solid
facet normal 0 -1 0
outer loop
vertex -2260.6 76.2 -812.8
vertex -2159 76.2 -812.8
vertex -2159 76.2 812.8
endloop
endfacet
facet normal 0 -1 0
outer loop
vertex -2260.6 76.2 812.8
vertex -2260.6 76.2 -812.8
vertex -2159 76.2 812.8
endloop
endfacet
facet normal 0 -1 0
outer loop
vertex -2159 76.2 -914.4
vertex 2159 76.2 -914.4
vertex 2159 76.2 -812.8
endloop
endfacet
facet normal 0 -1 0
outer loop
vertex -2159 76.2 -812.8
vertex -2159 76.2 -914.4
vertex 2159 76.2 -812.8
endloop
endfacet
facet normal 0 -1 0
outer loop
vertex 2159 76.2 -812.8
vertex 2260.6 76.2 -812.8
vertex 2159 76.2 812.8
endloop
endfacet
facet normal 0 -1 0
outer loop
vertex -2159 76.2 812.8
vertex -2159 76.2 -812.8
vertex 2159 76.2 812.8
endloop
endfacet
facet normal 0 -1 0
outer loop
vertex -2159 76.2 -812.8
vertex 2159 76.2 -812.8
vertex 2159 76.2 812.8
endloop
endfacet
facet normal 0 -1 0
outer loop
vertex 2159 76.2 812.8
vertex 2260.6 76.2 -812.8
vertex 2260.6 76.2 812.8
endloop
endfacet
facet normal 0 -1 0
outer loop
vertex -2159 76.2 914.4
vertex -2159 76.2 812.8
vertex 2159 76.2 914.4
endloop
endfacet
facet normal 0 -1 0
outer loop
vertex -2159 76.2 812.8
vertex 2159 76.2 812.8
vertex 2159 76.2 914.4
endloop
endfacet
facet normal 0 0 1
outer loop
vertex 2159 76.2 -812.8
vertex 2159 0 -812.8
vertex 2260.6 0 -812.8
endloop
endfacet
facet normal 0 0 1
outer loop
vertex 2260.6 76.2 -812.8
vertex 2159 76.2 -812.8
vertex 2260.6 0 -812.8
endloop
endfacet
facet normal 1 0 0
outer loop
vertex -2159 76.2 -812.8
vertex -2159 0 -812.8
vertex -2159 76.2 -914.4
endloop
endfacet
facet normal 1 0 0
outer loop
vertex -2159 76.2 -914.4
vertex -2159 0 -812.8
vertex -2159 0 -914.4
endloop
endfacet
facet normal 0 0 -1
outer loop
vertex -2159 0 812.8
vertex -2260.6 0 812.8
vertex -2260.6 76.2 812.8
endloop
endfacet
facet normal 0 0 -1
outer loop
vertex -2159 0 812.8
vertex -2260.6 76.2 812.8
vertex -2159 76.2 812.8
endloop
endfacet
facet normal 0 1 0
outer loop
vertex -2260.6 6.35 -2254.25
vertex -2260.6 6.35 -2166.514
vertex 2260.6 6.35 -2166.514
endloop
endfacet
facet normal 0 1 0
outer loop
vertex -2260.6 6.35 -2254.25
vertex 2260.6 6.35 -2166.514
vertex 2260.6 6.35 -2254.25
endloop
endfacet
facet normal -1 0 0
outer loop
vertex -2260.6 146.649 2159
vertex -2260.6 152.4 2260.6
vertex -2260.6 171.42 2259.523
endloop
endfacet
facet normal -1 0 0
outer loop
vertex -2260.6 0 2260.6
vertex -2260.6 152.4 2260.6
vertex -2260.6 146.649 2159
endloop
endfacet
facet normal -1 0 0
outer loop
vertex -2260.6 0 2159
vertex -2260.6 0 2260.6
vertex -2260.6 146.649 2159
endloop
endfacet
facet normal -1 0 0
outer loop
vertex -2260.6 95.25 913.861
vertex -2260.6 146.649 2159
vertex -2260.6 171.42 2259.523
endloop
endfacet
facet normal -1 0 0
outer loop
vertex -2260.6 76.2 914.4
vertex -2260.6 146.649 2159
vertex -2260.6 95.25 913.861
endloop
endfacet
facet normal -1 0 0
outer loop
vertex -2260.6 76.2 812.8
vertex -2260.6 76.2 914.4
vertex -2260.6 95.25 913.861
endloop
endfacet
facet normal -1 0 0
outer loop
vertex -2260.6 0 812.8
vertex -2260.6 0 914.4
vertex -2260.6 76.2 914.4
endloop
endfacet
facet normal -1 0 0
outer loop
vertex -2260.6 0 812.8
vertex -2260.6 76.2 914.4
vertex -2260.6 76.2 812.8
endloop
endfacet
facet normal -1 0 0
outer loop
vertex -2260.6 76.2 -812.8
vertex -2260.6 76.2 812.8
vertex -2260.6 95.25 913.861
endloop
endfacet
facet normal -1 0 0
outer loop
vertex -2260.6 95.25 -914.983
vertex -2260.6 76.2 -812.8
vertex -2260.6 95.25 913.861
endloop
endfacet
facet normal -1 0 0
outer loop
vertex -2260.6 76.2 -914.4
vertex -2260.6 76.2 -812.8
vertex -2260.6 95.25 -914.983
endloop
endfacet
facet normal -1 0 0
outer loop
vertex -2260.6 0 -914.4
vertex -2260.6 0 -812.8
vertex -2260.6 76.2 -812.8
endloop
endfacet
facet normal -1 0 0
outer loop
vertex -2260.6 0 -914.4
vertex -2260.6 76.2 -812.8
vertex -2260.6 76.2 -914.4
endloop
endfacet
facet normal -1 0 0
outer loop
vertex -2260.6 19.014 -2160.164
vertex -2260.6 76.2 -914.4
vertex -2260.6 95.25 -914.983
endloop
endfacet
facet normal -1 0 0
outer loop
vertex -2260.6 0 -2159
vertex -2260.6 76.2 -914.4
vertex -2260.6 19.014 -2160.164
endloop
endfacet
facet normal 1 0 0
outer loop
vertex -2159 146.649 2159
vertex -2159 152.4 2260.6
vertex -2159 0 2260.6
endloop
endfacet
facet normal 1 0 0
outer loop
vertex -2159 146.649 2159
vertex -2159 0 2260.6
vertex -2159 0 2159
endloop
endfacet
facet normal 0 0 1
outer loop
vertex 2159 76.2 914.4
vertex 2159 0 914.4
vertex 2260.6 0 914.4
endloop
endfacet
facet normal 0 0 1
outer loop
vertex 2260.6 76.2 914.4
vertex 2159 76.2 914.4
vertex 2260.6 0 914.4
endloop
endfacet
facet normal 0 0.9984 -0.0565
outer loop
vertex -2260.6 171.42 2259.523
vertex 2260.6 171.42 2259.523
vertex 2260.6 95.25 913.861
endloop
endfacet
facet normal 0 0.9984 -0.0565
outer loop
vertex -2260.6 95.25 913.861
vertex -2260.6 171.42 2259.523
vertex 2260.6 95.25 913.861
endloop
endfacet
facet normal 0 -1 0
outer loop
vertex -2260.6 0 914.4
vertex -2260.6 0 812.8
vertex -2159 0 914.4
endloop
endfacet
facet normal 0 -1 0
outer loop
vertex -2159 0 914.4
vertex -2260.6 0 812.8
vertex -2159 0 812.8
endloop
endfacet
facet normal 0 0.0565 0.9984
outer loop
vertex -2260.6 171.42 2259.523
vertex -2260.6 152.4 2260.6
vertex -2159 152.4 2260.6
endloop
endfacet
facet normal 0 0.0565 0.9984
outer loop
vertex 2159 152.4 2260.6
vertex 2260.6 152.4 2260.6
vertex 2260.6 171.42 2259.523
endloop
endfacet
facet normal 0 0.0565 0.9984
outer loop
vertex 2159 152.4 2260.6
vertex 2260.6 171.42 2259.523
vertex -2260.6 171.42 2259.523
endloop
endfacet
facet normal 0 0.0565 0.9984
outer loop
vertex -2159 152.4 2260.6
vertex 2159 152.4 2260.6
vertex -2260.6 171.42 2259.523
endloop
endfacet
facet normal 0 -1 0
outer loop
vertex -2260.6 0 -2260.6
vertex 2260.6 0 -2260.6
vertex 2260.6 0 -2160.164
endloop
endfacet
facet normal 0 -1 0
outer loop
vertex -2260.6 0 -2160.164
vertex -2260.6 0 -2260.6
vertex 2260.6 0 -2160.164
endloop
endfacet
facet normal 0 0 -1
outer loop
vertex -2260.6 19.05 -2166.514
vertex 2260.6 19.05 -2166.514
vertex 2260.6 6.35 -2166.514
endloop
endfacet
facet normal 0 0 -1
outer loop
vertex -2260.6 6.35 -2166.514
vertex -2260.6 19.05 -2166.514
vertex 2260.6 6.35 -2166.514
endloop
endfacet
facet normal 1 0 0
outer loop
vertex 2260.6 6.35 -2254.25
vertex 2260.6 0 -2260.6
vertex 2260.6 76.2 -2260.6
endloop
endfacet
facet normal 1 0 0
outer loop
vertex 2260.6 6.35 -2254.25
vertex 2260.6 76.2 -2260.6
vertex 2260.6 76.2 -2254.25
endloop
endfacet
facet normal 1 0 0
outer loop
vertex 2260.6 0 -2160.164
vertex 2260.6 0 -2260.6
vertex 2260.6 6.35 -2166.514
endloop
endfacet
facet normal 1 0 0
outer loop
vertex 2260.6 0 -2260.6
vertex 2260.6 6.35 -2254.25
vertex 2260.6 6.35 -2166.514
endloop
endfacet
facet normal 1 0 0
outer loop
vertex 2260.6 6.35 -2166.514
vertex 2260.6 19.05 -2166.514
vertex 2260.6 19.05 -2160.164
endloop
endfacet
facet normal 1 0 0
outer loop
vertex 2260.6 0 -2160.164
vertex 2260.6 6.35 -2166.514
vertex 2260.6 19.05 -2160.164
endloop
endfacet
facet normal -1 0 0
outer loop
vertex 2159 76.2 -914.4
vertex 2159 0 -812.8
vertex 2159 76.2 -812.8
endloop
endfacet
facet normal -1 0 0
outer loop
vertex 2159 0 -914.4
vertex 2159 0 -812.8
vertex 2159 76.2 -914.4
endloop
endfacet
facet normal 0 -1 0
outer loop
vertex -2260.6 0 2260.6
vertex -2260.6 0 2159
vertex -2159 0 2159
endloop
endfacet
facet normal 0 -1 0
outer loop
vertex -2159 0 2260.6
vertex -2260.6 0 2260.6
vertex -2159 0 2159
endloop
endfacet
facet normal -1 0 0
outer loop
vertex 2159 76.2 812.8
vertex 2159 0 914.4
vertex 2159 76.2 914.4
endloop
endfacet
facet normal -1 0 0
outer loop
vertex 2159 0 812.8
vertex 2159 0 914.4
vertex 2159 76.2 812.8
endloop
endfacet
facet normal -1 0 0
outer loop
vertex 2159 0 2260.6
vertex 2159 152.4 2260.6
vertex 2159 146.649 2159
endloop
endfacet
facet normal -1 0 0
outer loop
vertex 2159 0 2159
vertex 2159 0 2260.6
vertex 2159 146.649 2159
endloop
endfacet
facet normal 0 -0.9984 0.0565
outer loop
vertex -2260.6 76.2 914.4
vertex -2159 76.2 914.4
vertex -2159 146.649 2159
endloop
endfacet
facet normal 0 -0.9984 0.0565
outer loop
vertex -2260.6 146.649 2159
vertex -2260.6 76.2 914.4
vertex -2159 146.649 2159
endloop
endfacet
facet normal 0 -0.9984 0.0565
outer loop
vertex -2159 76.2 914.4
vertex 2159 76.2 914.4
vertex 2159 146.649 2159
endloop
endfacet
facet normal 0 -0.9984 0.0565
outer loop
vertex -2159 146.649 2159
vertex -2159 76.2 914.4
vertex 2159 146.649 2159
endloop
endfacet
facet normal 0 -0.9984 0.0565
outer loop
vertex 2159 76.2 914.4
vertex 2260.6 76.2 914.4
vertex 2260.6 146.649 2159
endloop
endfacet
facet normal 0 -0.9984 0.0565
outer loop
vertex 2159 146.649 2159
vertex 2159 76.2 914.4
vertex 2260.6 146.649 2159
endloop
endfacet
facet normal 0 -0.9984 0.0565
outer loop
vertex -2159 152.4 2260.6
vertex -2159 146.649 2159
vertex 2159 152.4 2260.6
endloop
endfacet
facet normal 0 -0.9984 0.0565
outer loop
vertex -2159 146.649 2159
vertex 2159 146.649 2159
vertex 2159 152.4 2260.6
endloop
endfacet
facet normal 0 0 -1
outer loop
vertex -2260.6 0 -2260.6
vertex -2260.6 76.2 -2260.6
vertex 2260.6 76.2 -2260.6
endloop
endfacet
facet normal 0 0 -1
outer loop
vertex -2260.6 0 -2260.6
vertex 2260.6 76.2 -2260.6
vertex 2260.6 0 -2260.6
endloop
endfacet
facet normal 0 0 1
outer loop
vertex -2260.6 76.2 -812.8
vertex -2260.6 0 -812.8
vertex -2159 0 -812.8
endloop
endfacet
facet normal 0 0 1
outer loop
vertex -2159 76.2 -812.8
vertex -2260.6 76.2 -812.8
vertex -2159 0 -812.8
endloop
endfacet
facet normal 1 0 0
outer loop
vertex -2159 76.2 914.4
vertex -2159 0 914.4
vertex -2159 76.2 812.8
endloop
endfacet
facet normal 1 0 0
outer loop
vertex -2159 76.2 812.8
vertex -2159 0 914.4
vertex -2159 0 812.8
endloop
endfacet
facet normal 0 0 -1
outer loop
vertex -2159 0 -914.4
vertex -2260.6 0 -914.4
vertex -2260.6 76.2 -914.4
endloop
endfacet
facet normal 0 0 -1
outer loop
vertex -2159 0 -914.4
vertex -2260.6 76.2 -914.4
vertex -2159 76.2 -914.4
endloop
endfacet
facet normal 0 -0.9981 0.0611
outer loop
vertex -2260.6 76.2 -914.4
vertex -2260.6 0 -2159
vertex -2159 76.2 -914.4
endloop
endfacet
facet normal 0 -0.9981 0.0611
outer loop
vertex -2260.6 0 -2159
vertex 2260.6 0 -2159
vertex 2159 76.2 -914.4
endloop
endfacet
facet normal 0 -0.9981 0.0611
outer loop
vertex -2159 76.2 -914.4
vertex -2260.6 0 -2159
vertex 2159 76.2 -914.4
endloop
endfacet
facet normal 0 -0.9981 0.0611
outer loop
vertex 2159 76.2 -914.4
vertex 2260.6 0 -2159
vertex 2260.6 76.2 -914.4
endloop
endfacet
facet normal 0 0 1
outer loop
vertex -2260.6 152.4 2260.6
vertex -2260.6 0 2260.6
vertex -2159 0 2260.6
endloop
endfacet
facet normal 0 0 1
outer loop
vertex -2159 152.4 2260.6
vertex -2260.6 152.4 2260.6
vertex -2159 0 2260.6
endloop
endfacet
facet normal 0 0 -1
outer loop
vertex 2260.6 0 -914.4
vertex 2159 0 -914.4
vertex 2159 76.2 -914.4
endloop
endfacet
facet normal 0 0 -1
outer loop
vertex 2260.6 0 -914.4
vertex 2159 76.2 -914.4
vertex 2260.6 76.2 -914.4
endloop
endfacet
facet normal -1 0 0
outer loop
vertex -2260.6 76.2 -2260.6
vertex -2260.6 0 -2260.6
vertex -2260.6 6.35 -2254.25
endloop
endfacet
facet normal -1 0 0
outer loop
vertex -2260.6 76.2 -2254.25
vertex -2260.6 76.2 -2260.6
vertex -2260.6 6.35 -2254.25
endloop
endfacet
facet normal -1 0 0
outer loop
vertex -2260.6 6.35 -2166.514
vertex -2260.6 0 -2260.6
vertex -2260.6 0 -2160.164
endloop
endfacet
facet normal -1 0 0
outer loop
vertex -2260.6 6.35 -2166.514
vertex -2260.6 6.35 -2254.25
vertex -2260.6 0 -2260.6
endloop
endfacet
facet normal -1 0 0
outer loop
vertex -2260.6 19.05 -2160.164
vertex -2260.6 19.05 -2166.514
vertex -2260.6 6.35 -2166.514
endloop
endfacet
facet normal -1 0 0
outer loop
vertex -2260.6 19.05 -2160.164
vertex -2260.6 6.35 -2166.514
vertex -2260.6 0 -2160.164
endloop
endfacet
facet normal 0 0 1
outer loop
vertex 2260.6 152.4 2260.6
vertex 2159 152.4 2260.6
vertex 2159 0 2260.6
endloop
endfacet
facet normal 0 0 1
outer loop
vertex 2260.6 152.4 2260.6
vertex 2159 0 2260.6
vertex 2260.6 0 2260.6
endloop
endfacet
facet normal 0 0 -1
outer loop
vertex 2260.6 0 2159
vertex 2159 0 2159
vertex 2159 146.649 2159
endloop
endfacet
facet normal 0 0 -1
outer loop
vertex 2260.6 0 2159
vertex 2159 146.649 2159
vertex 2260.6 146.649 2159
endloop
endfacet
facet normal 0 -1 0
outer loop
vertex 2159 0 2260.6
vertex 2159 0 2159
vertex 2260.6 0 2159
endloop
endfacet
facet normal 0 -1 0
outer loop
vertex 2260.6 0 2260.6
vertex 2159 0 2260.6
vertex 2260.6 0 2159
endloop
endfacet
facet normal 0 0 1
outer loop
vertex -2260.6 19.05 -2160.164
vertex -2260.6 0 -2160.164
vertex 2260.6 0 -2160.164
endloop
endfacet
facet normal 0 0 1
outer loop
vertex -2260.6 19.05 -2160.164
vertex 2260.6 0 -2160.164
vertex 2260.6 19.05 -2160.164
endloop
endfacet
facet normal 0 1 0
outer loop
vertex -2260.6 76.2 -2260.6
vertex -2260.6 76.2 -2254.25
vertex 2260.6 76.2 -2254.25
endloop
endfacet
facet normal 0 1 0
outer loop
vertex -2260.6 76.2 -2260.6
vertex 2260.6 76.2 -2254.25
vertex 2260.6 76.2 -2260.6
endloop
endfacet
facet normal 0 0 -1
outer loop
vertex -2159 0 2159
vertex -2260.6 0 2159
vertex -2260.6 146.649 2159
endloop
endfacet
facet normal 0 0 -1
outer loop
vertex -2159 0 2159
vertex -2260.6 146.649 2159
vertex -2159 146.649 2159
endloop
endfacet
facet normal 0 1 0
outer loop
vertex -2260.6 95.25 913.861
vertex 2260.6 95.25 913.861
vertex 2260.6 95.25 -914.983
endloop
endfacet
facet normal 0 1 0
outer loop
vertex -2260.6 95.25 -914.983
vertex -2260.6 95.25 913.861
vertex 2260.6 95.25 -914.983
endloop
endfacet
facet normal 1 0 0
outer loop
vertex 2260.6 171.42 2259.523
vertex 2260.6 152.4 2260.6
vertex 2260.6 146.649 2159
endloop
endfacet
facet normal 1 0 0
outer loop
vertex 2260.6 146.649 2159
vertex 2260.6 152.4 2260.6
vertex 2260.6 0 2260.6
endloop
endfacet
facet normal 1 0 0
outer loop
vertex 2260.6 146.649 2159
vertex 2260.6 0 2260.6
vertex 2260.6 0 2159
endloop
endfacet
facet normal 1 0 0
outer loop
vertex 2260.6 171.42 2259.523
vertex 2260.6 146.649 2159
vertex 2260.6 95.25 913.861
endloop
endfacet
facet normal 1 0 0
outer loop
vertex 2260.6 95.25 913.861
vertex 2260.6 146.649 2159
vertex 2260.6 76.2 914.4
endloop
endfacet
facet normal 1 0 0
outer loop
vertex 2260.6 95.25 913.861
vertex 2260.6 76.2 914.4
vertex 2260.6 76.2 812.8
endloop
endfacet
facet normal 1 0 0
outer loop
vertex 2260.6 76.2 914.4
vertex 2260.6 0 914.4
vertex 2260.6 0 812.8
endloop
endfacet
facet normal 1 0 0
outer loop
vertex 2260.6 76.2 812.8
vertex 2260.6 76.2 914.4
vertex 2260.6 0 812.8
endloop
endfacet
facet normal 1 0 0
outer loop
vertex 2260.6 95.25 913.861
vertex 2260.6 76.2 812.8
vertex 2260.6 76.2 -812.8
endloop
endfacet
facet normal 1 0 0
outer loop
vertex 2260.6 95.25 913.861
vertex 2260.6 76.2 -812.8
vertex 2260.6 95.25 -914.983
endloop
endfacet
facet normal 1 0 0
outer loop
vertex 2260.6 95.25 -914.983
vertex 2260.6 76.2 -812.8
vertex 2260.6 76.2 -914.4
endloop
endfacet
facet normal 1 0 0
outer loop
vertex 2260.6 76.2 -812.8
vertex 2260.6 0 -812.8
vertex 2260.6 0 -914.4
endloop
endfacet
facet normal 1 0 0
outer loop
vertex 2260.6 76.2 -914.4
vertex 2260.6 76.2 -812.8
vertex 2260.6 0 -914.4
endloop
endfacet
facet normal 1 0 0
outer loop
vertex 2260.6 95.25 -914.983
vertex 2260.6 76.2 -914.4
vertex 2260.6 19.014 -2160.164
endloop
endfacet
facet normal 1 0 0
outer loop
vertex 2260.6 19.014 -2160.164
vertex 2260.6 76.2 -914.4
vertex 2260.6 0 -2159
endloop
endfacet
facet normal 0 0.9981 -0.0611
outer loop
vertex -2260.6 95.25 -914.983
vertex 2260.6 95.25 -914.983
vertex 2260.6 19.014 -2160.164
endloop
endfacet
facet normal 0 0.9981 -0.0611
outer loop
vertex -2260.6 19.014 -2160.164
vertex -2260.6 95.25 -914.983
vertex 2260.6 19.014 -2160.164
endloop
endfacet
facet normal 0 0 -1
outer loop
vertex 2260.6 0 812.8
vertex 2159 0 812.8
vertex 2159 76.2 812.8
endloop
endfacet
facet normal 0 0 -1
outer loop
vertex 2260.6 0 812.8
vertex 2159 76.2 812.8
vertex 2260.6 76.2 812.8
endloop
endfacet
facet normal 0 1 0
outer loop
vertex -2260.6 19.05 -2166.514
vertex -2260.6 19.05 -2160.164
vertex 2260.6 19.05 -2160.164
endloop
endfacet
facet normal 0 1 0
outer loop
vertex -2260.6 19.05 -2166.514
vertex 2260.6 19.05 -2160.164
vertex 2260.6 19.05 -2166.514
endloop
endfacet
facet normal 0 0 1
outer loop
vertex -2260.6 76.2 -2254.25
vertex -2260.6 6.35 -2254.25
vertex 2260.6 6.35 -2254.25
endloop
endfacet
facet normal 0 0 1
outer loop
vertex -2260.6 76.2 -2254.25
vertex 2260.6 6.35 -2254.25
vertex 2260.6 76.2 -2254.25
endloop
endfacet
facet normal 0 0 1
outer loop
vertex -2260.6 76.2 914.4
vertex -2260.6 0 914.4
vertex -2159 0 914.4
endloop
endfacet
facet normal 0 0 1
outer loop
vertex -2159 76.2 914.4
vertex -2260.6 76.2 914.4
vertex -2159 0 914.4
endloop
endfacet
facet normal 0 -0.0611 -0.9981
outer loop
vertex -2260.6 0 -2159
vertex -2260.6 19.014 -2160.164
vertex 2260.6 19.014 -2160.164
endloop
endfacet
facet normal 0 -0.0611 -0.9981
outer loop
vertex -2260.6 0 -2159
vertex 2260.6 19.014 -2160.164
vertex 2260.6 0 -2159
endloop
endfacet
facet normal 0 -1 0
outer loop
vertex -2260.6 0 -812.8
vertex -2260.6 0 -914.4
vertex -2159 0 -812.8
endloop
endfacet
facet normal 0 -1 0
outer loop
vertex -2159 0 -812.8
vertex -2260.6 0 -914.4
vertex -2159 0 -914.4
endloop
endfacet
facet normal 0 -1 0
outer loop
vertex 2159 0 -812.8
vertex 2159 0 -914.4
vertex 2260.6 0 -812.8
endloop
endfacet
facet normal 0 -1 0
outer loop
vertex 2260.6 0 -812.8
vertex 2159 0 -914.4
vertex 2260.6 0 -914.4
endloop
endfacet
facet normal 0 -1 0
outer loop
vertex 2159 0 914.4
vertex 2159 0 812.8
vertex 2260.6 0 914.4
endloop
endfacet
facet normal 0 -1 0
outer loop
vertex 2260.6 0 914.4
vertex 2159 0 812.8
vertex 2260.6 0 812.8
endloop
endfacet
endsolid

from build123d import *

# Parameters (mm, degrees)
EXTRUDE_THIN1_DEPTH = 4521.2
BOSS_EXTRUDE1_REACH = 3203.564
SKETCH3_W           = 101.6
SKETCH3_H           = 101.6
BOSS_EXTRUDE2_REACH = 3200.389
SKETCH4_W           = 101.6
SKETCH4_H           = 101.6
BOSS_EXTRUDE3_DEPTH = 4521.2


with BuildPart() as part:
    # Sketch2 → Extrude-Thin1 (new body)
    with BuildSketch(Plane.ZY.offset(-2260.6)):
        Polygon((-2159, 0), (-914.4, 76.2), (914.4, 76.2), (2260.6, 152.4), (2259.523421406, 171.419555161), (913.861280224, 95.25), (-914.982617799, 95.25), (-2160.164146705, 19.014396189), align=None)
    extrude(amount=EXTRUDE_THIN1_DEPTH)

    # Boss-Extrude1: up to this face of the body (flat: up to its plane)
    boss_extrude1_end = Plane(part.part.faces().sort_by_distance((0, 76.2, 0))[0])
    # Sketch3 → Boss-Extrude1 (add, up to the picked face)
    with BuildSketch(Plane(origin=(0, 0, 0), x_dir=(1, 0, 0), z_dir=(0, 1, 0)), mode=Mode.PRIVATE) as boss_extrude1_sk1:
        with Locations((2209.8, -2209.8)):
            Rectangle(SKETCH3_W, SKETCH3_H)
    boss_extrude1_tool1 = split(extrude(boss_extrude1_sk1.sketch, amount=BOSS_EXTRUDE1_REACH, mode=Mode.PRIVATE), bisect_by=boss_extrude1_end, keep=Keep.BOTH, mode=Mode.PRIVATE)
    # Sketch3 → Boss-Extrude1 (add, up to the picked face)
    with BuildSketch(Plane(origin=(0, 0, 0), x_dir=(1, 0, 0), z_dir=(0, 1, 0)), mode=Mode.PRIVATE) as boss_extrude1_sk2:
        with Locations((-2209.8, -2209.8)):
            Rectangle(SKETCH3_W, SKETCH3_H)
    boss_extrude1_tool2 = split(extrude(boss_extrude1_sk2.sketch, amount=BOSS_EXTRUDE1_REACH, mode=Mode.PRIVATE), bisect_by=boss_extrude1_end, keep=Keep.BOTH, mode=Mode.PRIVATE)
    # Sketch3 → Boss-Extrude1 (add, up to the picked face)
    with BuildSketch(Plane(origin=(0, 0, 0), x_dir=(1, 0, 0), z_dir=(0, 1, 0)), mode=Mode.PRIVATE) as boss_extrude1_sk3:
        with Locations((-2209.8, -863.6)):
            Rectangle(SKETCH3_W, SKETCH3_H)
    boss_extrude1_tool3 = split(extrude(boss_extrude1_sk3.sketch, amount=BOSS_EXTRUDE1_REACH, mode=Mode.PRIVATE), bisect_by=boss_extrude1_end, keep=Keep.BOTH, mode=Mode.PRIVATE)
    # Sketch3 → Boss-Extrude1 (add, up to the picked face)
    with BuildSketch(Plane(origin=(0, 0, 0), x_dir=(1, 0, 0), z_dir=(0, 1, 0)), mode=Mode.PRIVATE) as boss_extrude1_sk4:
        with Locations((-2209.8, 863.6)):
            Rectangle(SKETCH3_W, SKETCH3_H)
    boss_extrude1_tool4 = split(extrude(boss_extrude1_sk4.sketch, amount=BOSS_EXTRUDE1_REACH, mode=Mode.PRIVATE), bisect_by=boss_extrude1_end, keep=Keep.BOTH, mode=Mode.PRIVATE)
    # Sketch3 → Boss-Extrude1 (add, up to the picked face)
    with BuildSketch(Plane(origin=(0, 0, 0), x_dir=(1, 0, 0), z_dir=(0, 1, 0)), mode=Mode.PRIVATE) as boss_extrude1_sk5:
        with Locations((2209.8, 863.6)):
            Rectangle(SKETCH3_W, SKETCH3_H)
    boss_extrude1_tool5 = split(extrude(boss_extrude1_sk5.sketch, amount=BOSS_EXTRUDE1_REACH, mode=Mode.PRIVATE), bisect_by=boss_extrude1_end, keep=Keep.BOTH, mode=Mode.PRIVATE)
    # Sketch3 → Boss-Extrude1 (add, up to the picked face)
    with BuildSketch(Plane(origin=(0, 0, 0), x_dir=(1, 0, 0), z_dir=(0, 1, 0)), mode=Mode.PRIVATE) as boss_extrude1_sk6:
        with Locations((2209.8, -863.6)):
            Rectangle(SKETCH3_W, SKETCH3_H)
    boss_extrude1_tool6 = split(extrude(boss_extrude1_sk6.sketch, amount=BOSS_EXTRUDE1_REACH, mode=Mode.PRIVATE), bisect_by=boss_extrude1_end, keep=Keep.BOTH, mode=Mode.PRIVATE)
    add(boss_extrude1_tool1.solids().sort_by(Axis((2209.8, 0, 2209.8), (0, 1, 0)))[0])
    add(boss_extrude1_tool2.solids().sort_by(Axis((-2209.8, 0, 2209.8), (0, 1, 0)))[0])
    add(boss_extrude1_tool3.solids().sort_by(Axis((-2209.8, 0, 863.6), (0, 1, 0)))[0])
    add(boss_extrude1_tool4.solids().sort_by(Axis((-2209.8, 0, -863.6), (0, 1, 0)))[0])
    add(boss_extrude1_tool5.solids().sort_by(Axis((2209.8, 0, -863.6), (0, 1, 0)))[0])
    add(boss_extrude1_tool6.solids().sort_by(Axis((2209.8, 0, 863.6), (0, 1, 0)))[0])


with BuildPart() as boss_extrude1_piece_1:
    # of the separate pieces the step leaves, piece 1, a body of its own (boss_extrude1_pieces)
    add(part.part.solids().sort_by_distance((2260.6, 0, -2159))[0])



with BuildPart() as boss_extrude1_piece_2:
    # of the separate pieces the step leaves, piece 2, a body of its own (boss_extrude1_pieces)
    add(part.part.solids().sort_by_distance((-2260.6, 0, 2260.6))[0])


with BuildPart() as boss_extrude1_piece_3:
    # of the separate pieces the step leaves, piece 3, a body of its own (boss_extrude1_pieces)
    add(part.part.solids().sort_by_distance((2260.6, 0, 2260.6))[0])


with BuildPart() as boss_extrude1_piece_1_1:
    add(boss_extrude1_piece_1.part)

    add(boss_extrude1_piece_2.part)  # Boss-Extrude2 merges Boss-Extrude1 piece 2

    add(boss_extrude1_piece_3.part)  # Boss-Extrude2 merges Boss-Extrude1 piece 3
    # Boss-Extrude2: up to this plane
    boss_extrude2_end = Plane(origin=(-2260.6, 76.2, 914.4), z_dir=(0, 0.9984018457335854, -0.05651331202265579))
    # Sketch4 → Boss-Extrude2 (add, up to the surface)
    with BuildSketch(Plane(origin=(0, 76.2, 0), x_dir=(1, 0, 0), z_dir=(0, 1, 0)), mode=Mode.PRIVATE) as boss_extrude2_sk1:
        with Locations((2209.8, -2209.8)):
            Rectangle(SKETCH4_W, SKETCH4_H)
    boss_extrude2_tool1 = split(extrude(boss_extrude2_sk1.sketch, amount=BOSS_EXTRUDE2_REACH, mode=Mode.PRIVATE), bisect_by=boss_extrude2_end, keep=Keep.BOTH, mode=Mode.PRIVATE)
    add(boss_extrude2_tool1.solids().sort_by_distance((2209.8, 76.2, 2209.8))[0])
    # Sketch4 → Boss-Extrude2 (add, up to the surface)
    with BuildSketch(Plane(origin=(0, 76.2, 0), x_dir=(1, 0, 0), z_dir=(0, 1, 0)), mode=Mode.PRIVATE) as boss_extrude2_sk2:
        with Locations((-2209.8, -2209.8)):
            Rectangle(SKETCH4_W, SKETCH4_H)
    boss_extrude2_tool2 = split(extrude(boss_extrude2_sk2.sketch, amount=BOSS_EXTRUDE2_REACH, mode=Mode.PRIVATE), bisect_by=boss_extrude2_end, keep=Keep.BOTH, mode=Mode.PRIVATE)
    add(boss_extrude2_tool2.solids().sort_by_distance((-2209.8, 76.2, 2209.8))[0])


with BuildPart() as body_2:
    # Sketch5 → Boss-Extrude3 (new body)
    with BuildSketch(Plane.ZY.offset(2260.6)):
        Polygon((-2260.6, 76.2), (-2260.6, 0), (-2160.164146705, 0), (-2160.164146705, 19.05), (-2166.514146705, 19.05), (-2166.514146705, 6.35), (-2254.25, 6.35), (-2254.25, 76.2), align=None)
    extrude(amount=-BOSS_EXTRUDE3_DEPTH)


solid = Compound([boss_extrude1_piece_1_1.part, body_2.part])
